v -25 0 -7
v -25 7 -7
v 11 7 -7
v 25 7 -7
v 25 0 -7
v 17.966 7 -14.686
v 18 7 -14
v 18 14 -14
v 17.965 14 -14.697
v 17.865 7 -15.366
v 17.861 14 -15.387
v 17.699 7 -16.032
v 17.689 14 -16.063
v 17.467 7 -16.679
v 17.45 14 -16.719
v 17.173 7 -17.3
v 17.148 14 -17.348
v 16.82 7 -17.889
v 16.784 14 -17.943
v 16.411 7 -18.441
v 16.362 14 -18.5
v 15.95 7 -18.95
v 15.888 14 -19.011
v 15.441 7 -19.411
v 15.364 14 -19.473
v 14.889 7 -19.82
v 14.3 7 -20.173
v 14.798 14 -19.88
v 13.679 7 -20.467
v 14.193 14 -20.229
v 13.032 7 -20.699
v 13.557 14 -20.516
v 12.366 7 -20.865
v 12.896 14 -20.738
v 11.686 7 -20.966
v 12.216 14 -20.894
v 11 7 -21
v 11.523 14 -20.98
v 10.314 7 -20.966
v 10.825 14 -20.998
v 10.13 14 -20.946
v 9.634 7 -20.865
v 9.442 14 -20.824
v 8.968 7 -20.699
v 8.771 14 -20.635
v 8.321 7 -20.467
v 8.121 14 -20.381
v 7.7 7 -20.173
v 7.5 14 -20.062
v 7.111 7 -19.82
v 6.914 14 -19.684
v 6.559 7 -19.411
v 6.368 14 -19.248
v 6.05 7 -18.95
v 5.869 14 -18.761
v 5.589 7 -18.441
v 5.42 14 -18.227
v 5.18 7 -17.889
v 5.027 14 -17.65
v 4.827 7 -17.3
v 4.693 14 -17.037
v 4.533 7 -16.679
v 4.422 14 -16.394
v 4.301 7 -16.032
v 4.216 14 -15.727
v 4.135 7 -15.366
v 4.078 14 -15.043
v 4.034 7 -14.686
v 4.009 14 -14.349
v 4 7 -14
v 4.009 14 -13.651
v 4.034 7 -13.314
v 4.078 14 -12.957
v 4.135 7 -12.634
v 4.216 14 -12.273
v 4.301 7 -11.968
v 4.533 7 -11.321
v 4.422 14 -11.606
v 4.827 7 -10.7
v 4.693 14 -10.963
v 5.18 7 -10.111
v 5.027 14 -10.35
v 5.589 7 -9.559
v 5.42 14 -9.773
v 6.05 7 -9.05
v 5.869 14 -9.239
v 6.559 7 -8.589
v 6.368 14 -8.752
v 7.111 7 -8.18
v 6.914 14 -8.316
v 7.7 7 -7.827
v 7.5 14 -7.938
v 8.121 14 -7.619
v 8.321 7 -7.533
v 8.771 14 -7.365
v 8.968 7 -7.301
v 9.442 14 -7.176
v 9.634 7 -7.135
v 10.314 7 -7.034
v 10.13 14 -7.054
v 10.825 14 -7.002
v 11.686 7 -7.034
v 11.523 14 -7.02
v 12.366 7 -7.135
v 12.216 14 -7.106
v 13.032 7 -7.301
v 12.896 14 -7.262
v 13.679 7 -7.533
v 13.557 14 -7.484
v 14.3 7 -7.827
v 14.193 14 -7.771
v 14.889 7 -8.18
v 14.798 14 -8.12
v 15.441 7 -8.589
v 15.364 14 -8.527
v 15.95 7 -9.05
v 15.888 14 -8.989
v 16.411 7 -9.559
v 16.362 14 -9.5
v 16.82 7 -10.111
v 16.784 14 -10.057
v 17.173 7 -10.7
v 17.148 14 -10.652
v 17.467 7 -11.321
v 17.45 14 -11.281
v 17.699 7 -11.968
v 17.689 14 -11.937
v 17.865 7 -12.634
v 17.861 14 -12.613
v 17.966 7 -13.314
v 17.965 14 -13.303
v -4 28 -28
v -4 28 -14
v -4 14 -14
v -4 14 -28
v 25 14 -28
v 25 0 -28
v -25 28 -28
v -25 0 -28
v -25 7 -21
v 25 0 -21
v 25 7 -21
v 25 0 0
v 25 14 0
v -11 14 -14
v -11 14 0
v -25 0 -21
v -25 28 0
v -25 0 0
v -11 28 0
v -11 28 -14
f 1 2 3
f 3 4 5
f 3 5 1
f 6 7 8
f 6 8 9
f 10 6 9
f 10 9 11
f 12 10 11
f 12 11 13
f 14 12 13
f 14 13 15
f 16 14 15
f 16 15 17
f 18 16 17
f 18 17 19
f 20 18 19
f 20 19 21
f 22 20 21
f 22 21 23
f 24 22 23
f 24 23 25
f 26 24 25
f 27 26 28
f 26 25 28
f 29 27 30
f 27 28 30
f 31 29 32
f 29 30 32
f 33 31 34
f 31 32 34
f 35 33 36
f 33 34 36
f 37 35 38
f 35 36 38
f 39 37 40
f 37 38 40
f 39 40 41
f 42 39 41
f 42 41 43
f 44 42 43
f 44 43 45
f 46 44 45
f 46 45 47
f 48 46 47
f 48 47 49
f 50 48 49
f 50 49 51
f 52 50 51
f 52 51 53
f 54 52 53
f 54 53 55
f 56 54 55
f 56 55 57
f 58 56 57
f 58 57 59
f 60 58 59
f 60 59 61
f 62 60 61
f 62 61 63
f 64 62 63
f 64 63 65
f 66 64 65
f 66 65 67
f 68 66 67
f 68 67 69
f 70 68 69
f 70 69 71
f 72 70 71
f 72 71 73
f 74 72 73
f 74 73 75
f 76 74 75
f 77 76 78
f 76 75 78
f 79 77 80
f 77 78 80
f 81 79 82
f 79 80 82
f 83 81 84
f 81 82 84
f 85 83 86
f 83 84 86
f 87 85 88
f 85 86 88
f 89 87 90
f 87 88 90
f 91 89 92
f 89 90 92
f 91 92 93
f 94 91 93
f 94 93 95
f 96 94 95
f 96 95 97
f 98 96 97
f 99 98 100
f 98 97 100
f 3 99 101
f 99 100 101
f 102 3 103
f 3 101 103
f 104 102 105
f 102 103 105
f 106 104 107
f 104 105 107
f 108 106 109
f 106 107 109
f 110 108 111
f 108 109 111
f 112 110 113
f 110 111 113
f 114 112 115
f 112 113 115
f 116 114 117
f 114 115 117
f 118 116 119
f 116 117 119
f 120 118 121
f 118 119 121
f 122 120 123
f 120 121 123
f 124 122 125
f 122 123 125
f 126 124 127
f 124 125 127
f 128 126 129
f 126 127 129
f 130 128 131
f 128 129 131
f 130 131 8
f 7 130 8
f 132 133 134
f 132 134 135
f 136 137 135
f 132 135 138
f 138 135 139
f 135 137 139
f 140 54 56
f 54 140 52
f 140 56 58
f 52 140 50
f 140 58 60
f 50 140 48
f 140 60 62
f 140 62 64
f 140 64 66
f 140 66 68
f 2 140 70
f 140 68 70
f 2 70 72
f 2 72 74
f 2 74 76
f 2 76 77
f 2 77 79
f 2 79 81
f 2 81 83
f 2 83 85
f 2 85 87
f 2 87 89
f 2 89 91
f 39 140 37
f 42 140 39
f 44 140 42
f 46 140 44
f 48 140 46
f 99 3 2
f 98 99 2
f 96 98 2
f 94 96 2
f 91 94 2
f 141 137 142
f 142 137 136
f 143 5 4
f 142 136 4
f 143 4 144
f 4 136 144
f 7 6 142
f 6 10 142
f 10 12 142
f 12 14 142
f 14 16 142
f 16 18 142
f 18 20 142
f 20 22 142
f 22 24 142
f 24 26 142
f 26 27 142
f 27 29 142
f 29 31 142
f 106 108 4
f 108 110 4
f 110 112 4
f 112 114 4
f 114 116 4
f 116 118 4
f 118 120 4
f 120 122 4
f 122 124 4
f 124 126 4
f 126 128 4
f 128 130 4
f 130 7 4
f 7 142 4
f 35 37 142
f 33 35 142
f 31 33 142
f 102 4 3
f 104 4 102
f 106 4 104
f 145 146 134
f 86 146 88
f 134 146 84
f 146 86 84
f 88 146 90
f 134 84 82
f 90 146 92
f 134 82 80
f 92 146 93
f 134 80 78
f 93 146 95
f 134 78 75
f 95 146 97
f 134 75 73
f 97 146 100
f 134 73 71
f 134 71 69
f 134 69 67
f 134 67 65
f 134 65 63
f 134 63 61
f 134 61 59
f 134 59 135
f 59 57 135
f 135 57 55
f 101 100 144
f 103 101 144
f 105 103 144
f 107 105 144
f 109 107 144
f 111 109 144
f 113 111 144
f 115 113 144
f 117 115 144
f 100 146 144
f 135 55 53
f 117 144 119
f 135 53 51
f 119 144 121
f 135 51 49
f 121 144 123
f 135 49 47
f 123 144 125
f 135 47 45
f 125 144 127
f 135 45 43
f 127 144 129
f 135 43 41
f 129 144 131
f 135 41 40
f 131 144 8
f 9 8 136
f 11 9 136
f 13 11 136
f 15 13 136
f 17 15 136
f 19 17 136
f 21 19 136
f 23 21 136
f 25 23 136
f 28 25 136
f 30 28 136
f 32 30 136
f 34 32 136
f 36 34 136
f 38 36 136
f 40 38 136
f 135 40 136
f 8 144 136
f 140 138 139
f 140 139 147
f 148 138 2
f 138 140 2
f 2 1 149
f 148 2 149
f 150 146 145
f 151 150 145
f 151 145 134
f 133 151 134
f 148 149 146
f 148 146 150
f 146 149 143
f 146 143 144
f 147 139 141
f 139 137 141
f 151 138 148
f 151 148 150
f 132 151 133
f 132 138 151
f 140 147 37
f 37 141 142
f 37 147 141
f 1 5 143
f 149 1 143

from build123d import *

# Parameters (mm, degrees)
BOSS_EXTRUDE1_DEPTH = 25
CUT_EXTRUDE1_REACH  = 16
SKETCH2_R           = 7
BOSS_EXTRUDE2_DEPTH = 14


with BuildPart() as part:
    # Sketch1 → Boss-Extrude1 (new body, symmetric)
    with BuildSketch(Plane(origin=(0, 0, 0), x_dir=(0, 0, -1), z_dir=(1, 0, 0))):
        Polygon((0, 0), (0, 14), (28, 14), (28, 0), (21, 0), (21, 7), (7, 7), (7, 0), align=None)
    extrude(amount=BOSS_EXTRUDE1_DEPTH, both=True)

    # Sketch2 → Cut-Extrude1 (cut, up to next)
    with BuildSketch(Plane(origin=(0, 14, 0), x_dir=(1, 0, 0), z_dir=(0, 1, 0)), mode=Mode.PRIVATE) as cut_extrude1_sk1:
        with Locations((11, 14)):
            Circle(SKETCH2_R)
    cut_extrude1_tool1 = extrude(cut_extrude1_sk1.sketch, amount=-CUT_EXTRUDE1_REACH, mode=Mode.PRIVATE) & part.part
    add(cut_extrude1_tool1.solids().sort_by_distance((11, 14, -14))[0], mode=Mode.SUBTRACT)

    # Sketch3 → Boss-Extrude2 (add)
    with BuildSketch(Plane(origin=(0, 14, 0), x_dir=(1, 0, 0), z_dir=(0, 1, 0))):
        Polygon((-4, 14), (-4, 28), (-25, 28), (-25, 0), (-11, 0), (-11, 14), align=None)
    extrude(amount=BOSS_EXTRUDE2_DEPTH)


solid = part.part
